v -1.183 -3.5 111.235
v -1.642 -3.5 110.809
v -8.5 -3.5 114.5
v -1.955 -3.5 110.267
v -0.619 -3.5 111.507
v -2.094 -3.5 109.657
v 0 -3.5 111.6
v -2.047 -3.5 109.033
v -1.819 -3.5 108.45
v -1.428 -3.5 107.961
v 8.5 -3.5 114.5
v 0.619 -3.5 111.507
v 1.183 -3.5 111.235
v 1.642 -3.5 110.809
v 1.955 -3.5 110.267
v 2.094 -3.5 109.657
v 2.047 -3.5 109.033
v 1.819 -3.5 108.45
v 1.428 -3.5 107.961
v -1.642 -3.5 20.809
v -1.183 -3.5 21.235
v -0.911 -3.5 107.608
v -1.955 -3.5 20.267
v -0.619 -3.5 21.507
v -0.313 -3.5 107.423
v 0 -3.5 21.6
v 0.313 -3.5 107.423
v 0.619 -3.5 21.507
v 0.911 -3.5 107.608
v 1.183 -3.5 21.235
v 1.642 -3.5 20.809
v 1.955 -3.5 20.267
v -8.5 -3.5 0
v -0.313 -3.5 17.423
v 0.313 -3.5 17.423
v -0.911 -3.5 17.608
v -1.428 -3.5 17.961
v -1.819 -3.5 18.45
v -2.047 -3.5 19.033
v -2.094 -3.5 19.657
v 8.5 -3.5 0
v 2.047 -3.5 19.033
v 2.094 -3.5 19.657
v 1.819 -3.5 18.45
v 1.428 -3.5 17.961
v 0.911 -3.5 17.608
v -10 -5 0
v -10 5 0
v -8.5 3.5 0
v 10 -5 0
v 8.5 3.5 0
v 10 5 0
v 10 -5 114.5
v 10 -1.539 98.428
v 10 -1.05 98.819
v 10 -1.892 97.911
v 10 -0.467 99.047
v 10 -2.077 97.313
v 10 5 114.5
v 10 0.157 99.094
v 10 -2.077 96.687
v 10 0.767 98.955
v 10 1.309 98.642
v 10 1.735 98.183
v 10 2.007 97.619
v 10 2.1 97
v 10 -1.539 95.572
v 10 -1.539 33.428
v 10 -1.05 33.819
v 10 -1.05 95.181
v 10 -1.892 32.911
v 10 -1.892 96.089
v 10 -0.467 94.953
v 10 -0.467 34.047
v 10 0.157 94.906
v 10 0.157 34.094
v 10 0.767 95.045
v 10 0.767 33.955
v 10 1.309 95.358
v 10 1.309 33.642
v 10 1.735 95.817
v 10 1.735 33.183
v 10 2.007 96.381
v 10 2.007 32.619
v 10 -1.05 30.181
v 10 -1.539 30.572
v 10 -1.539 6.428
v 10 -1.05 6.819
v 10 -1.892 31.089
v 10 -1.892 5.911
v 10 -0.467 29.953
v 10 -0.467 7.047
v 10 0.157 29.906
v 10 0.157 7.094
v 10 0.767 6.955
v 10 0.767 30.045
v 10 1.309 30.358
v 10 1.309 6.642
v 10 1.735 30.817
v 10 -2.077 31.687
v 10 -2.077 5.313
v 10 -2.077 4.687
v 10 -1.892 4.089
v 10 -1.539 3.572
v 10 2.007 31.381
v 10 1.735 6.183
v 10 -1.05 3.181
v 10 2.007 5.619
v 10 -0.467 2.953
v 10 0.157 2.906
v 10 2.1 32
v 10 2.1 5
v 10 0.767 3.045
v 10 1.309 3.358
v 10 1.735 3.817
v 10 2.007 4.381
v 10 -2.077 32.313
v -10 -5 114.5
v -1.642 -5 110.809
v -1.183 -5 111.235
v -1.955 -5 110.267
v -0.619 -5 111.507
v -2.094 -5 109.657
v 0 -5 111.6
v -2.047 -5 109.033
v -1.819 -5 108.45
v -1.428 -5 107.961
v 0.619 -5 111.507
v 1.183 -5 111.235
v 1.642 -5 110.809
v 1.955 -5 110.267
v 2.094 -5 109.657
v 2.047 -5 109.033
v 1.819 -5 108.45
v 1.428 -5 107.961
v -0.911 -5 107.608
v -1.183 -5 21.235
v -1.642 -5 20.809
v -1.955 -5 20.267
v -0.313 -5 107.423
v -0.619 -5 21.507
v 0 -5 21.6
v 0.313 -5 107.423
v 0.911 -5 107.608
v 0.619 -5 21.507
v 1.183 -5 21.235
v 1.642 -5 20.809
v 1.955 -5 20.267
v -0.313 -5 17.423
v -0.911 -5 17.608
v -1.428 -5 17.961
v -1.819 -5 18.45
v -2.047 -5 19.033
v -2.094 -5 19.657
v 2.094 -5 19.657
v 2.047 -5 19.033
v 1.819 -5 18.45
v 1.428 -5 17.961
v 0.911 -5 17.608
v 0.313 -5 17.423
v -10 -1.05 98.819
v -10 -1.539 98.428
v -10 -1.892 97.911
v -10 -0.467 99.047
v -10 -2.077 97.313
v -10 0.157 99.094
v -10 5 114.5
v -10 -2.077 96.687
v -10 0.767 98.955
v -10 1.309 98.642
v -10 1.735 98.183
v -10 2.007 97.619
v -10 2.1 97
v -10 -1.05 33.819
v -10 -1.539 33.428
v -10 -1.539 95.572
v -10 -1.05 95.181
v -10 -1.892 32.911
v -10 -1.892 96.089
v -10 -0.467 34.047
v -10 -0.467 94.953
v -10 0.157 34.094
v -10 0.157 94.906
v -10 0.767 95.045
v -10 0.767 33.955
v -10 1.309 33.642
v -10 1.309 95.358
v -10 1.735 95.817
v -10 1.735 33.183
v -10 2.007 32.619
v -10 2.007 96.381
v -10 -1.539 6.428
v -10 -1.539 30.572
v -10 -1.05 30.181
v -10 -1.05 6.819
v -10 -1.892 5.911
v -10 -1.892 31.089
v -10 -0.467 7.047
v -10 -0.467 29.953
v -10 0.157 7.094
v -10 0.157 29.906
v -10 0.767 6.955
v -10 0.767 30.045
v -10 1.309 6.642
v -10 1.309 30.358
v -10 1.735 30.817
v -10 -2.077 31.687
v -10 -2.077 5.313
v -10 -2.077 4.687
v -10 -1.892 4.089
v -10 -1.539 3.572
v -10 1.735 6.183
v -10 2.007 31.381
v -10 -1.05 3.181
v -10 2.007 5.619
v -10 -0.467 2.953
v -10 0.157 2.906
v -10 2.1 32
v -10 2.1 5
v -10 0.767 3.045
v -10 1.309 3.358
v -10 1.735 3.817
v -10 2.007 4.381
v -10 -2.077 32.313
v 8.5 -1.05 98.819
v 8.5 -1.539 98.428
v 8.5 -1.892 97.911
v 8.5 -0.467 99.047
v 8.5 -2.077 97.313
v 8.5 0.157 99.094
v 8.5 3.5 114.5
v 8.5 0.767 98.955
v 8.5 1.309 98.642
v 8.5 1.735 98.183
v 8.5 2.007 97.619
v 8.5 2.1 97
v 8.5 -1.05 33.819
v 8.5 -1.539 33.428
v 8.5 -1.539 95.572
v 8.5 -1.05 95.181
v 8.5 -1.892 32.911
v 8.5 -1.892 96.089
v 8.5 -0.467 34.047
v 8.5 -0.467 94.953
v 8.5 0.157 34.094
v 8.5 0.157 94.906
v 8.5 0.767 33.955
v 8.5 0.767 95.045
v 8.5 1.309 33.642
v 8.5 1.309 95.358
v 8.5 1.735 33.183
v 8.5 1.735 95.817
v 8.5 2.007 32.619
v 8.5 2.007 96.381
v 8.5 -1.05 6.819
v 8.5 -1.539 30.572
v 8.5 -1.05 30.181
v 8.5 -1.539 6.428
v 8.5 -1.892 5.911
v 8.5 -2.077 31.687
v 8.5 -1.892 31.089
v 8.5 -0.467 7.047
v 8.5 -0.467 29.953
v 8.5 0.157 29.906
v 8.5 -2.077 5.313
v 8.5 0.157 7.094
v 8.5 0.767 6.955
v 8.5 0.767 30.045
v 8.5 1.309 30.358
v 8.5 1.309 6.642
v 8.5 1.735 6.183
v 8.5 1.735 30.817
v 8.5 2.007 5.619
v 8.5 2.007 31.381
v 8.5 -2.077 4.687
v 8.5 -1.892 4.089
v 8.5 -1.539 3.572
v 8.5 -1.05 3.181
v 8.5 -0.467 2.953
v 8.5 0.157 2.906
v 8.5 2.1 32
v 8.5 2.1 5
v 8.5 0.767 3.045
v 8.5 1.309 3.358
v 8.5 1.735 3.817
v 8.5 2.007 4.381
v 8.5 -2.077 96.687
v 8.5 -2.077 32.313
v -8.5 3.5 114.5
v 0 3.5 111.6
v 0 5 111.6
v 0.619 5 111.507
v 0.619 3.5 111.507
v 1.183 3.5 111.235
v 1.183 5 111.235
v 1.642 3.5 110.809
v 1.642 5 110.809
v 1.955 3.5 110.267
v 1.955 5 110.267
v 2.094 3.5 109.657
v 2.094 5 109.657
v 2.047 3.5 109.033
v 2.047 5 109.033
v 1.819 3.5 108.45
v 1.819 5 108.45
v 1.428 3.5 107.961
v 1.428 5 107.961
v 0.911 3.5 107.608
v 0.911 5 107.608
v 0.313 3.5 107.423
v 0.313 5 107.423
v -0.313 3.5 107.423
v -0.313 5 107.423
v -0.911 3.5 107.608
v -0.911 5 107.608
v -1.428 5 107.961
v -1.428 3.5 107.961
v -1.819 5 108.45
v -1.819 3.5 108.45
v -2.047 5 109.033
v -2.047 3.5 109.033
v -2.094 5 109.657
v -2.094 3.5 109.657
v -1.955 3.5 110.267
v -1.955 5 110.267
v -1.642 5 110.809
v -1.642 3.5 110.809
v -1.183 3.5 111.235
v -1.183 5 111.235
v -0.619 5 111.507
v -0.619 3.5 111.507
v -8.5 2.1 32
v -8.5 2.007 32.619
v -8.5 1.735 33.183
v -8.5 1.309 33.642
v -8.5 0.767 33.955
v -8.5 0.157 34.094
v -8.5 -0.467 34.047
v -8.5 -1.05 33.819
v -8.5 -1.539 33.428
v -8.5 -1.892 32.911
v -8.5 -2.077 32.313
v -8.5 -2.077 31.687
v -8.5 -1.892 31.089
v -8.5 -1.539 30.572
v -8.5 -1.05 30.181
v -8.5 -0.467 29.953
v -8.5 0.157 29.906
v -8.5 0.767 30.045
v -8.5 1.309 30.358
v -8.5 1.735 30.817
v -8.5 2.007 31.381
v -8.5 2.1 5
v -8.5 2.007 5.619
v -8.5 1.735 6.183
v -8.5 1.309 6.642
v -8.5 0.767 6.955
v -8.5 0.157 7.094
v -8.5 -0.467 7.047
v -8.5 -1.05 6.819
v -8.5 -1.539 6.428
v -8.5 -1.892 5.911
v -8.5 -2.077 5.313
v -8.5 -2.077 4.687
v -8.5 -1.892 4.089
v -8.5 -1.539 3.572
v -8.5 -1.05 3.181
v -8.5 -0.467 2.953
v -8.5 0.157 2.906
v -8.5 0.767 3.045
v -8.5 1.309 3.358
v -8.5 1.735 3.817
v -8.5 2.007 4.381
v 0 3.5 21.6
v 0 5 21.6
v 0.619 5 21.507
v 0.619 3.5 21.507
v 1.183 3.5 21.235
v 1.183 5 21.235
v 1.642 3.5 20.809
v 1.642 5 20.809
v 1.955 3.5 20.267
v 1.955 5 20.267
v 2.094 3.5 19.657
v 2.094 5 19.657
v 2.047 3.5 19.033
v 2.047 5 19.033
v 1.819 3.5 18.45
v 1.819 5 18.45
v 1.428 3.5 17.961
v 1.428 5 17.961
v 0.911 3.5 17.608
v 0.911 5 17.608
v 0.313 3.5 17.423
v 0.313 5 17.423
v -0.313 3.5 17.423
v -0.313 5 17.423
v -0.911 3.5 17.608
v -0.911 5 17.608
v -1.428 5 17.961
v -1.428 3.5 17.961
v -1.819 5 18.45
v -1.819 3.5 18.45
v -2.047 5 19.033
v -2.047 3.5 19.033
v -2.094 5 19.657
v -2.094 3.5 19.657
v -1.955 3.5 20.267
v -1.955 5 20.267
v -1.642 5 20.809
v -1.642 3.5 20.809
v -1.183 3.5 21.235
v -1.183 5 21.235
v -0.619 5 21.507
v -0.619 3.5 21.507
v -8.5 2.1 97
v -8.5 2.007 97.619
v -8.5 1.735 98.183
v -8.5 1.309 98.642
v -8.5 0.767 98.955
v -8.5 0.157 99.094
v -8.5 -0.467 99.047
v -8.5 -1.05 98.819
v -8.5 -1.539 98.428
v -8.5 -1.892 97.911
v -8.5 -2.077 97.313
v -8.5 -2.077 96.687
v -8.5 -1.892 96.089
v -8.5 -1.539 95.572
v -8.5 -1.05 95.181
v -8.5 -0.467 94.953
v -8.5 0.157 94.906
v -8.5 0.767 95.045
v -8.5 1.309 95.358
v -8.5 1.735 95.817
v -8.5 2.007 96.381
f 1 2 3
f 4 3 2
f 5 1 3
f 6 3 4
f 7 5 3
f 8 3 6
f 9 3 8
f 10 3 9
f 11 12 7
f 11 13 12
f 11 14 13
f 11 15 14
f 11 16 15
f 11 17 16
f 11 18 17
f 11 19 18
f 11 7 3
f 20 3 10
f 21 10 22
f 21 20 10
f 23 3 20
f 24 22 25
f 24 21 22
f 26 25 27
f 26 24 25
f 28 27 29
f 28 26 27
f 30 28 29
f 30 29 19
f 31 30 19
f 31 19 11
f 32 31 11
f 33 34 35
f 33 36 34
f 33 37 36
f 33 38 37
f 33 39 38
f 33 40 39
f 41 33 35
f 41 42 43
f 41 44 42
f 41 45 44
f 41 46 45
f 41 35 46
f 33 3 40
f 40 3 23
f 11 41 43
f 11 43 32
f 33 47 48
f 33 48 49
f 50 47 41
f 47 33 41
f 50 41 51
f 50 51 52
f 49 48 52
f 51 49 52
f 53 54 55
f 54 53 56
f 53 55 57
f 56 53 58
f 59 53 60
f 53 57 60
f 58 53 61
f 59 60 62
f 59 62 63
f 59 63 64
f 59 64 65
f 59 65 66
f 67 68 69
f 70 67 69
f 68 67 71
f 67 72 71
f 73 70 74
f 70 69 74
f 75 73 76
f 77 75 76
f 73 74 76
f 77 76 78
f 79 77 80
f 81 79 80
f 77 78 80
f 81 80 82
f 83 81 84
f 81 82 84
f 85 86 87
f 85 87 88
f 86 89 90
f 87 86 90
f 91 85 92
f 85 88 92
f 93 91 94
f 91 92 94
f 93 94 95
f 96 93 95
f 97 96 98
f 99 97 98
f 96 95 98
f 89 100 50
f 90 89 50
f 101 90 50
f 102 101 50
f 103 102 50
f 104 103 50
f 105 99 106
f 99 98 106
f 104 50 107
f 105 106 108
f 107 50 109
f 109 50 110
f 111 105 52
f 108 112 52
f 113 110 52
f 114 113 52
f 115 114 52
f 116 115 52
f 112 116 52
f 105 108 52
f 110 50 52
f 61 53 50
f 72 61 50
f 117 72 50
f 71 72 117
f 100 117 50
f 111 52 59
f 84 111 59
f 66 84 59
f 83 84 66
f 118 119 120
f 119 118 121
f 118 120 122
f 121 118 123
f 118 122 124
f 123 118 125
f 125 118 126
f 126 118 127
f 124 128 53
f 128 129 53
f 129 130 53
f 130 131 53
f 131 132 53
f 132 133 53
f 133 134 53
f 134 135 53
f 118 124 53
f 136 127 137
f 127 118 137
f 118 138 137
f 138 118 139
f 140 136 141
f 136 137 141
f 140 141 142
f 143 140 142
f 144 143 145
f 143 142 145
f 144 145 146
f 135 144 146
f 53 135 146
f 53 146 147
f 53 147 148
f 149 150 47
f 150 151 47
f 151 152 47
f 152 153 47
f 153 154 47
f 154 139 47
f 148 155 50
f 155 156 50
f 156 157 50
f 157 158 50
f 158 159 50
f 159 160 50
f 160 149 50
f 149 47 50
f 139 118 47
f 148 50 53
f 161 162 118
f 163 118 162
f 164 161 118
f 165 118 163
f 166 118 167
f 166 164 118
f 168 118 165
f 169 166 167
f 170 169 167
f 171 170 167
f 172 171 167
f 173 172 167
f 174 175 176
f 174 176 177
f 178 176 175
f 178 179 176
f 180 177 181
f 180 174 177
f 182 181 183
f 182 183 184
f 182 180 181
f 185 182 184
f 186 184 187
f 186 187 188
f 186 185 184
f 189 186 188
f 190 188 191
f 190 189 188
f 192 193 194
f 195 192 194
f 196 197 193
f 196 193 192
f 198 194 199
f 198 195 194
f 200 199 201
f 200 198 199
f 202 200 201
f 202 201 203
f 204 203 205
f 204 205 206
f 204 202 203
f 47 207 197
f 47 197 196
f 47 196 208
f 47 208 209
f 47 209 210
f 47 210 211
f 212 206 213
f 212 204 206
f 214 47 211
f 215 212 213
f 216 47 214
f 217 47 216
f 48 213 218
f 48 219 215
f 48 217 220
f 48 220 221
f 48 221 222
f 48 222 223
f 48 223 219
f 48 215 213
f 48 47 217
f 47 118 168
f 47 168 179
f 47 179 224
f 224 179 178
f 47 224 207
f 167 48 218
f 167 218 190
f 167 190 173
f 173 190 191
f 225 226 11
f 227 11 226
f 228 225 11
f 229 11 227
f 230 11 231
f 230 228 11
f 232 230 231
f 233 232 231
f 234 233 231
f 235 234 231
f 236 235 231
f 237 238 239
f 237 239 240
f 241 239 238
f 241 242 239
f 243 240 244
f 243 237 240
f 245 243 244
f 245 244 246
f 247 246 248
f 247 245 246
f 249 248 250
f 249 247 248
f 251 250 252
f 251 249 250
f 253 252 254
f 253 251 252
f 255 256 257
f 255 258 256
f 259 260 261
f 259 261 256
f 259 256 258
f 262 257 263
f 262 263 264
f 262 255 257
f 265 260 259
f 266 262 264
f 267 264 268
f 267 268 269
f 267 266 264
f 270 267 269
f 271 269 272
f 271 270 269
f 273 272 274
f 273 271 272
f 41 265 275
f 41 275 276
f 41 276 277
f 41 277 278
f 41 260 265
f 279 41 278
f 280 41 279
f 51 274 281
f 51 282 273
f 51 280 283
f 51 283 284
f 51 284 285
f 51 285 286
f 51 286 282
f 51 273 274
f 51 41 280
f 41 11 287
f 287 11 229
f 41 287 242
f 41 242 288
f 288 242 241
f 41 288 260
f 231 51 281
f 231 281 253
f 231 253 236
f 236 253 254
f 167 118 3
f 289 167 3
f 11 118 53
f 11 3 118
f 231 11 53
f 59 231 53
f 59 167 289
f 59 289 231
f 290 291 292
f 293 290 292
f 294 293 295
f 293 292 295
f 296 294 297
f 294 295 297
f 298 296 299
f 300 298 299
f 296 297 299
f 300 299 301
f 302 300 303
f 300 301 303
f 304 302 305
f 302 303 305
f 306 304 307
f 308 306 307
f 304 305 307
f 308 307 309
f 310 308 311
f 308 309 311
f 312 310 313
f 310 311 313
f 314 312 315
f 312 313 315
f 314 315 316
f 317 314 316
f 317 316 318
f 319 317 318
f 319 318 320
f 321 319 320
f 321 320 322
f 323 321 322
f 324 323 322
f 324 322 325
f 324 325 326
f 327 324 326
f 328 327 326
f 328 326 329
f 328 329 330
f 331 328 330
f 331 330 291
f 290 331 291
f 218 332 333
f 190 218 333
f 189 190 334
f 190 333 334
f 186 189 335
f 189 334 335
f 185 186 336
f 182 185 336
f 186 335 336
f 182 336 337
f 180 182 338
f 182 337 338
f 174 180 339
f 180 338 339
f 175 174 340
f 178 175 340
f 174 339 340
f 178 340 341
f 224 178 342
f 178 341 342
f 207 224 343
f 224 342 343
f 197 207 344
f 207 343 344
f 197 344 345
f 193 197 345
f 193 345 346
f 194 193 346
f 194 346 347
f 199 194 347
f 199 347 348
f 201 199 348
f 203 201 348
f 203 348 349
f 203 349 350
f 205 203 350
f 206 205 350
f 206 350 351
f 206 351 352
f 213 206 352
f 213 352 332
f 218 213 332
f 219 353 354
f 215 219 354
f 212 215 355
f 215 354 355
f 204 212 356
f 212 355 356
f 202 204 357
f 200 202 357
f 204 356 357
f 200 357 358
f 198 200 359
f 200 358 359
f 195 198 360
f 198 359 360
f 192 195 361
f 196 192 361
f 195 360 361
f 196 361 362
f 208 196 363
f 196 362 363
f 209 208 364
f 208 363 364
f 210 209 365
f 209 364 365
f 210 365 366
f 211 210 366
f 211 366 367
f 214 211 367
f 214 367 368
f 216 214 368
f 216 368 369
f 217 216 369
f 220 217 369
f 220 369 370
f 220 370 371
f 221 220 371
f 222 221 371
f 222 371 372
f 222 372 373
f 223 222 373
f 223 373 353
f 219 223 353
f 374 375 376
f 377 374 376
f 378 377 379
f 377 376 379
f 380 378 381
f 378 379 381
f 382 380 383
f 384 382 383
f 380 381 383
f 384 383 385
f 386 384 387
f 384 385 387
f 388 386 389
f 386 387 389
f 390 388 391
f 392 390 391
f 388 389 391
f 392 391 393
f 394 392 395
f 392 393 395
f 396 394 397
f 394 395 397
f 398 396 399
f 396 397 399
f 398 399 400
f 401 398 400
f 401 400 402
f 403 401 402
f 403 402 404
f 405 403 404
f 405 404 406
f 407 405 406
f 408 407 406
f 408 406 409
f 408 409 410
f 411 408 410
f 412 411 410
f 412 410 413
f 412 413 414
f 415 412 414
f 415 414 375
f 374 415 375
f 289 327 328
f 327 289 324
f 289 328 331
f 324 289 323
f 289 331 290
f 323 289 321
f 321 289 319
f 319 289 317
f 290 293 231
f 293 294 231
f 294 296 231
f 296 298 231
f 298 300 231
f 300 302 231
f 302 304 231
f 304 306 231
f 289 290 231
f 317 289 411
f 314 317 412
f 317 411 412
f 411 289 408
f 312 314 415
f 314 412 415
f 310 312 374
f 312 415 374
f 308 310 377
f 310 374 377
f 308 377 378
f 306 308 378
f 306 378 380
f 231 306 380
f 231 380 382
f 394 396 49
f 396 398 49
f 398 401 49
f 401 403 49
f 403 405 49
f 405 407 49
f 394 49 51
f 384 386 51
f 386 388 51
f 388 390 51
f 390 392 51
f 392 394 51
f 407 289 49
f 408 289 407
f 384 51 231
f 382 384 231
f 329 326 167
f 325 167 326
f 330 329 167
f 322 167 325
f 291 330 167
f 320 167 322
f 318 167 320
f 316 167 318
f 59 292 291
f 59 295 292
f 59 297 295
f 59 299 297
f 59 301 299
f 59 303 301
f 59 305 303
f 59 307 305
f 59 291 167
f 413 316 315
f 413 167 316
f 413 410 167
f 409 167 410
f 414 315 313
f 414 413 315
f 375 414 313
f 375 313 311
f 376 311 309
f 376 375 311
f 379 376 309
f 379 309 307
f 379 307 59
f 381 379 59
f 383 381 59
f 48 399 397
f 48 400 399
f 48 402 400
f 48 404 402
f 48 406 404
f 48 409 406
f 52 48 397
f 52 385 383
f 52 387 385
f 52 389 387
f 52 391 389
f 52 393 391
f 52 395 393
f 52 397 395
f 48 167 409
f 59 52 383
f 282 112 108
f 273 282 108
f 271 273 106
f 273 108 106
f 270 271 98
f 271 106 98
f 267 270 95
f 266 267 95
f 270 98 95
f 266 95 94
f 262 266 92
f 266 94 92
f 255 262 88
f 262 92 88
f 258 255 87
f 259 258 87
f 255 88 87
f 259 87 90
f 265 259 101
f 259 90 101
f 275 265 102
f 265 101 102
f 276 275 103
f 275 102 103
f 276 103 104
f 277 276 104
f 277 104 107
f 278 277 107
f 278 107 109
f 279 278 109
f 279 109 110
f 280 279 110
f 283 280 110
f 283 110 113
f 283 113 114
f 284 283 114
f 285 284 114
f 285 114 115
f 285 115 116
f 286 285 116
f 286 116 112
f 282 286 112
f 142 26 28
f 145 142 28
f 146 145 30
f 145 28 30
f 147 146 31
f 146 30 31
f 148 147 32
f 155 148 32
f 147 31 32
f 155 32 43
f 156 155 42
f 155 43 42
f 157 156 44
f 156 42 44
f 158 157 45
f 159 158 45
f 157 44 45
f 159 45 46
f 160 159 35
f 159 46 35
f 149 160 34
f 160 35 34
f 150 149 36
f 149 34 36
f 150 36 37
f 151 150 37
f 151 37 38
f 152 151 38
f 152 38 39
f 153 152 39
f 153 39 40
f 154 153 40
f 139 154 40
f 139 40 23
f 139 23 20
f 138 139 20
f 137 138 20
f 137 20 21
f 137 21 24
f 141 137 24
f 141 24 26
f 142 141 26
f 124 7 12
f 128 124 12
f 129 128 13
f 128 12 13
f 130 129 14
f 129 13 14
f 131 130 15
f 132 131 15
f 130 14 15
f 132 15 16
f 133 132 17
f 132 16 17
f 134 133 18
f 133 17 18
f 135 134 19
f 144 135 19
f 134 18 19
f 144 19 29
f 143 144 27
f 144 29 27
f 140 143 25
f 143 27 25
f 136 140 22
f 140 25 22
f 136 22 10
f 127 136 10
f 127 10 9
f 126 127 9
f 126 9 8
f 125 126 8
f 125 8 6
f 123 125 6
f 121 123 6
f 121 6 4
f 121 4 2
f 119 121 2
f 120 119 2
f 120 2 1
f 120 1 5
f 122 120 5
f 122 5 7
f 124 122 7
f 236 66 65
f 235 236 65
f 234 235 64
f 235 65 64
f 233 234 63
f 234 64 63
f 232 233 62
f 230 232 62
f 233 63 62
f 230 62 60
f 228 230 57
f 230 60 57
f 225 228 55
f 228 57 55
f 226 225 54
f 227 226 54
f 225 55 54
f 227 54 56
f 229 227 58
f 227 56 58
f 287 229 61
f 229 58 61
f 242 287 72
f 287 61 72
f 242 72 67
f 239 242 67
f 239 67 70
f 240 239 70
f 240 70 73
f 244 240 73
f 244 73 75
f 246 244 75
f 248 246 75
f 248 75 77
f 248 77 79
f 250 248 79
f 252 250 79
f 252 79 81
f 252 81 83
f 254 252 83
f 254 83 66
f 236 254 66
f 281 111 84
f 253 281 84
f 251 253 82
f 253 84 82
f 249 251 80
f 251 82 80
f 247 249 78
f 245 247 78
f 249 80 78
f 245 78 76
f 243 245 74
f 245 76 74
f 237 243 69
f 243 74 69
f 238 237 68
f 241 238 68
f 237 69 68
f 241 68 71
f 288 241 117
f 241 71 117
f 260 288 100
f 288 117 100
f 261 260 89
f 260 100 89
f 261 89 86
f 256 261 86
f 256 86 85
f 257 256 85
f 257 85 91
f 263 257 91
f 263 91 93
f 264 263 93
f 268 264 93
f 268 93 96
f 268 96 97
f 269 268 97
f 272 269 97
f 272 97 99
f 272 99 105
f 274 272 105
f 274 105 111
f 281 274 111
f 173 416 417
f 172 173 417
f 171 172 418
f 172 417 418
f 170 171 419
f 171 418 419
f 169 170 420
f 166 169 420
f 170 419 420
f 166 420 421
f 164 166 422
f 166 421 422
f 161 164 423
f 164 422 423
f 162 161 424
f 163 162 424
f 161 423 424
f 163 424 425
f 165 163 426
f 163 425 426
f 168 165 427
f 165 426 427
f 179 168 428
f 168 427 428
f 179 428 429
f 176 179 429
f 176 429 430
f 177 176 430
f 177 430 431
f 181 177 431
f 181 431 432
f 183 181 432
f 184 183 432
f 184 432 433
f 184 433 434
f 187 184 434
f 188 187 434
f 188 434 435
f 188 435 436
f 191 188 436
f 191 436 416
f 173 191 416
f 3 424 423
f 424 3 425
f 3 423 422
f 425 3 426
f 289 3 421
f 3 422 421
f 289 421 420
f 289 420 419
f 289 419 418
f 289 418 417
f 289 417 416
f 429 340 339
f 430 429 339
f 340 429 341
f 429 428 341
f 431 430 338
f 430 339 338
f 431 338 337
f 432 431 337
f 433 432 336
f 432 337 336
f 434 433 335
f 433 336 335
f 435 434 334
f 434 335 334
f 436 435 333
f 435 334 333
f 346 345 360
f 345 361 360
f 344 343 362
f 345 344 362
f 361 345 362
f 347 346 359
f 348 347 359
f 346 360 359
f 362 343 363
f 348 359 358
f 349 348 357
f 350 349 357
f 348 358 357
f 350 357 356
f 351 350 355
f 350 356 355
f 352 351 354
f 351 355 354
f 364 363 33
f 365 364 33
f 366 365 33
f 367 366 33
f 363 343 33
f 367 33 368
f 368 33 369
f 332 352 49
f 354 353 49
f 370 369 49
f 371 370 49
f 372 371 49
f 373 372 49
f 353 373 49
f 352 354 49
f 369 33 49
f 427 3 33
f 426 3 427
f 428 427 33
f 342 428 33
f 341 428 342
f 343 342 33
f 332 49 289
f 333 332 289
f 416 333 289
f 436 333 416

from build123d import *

# Parameters (mm, degrees)
SKETCH_1_W          = 20
SKETCH_1_H          = 10
SKETCH_1_W_2        = 17
SKETCH_1_H_2        = 7
EXTRUDE_1_DEPTH     = 114.5
SKETCH_2_R          = 2.1
CUT_EXTRUDE_1_DEPTH = 117.341093342
SKETCH_3_R          = 2.1
CUT_EXTRUDE_2_DEPTH = 117.341093342
SKETCH_4_R          = 2.1
CUT_EXTRUDE_3_DEPTH = 116.370056774


with BuildPart() as part:
    # ｽｹｯﾁ1 → 押し出し-薄板1 (new body)
    with BuildSketch(Plane.XY):
        Rectangle(SKETCH_1_W, SKETCH_1_H)
        Rectangle(SKETCH_1_W_2, SKETCH_1_H_2, mode=Mode.SUBTRACT)
    extrude(amount=EXTRUDE_1_DEPTH)

    # ｽｹｯﾁ2 → ｶｯﾄ - 押し出し1 (cut, through all)
    with BuildSketch(Plane(origin=(10, 0, 0), x_dir=(0, 0, -1), z_dir=(1, 0, 0))):
        with Locations(Location((-97, 0, 0), (0, 0, 90))):
            Circle(SKETCH_2_R)
        with Locations(Location((-32, 0, 0), (0, 0, 90))):
            Circle(SKETCH_2_R)
    extrude(amount=-CUT_EXTRUDE_1_DEPTH, mode=Mode.SUBTRACT)

    # ｽｹｯﾁ3 → ｶｯﾄ - 押し出し2 (cut, through all)
    with BuildSketch(Plane(origin=(10, 0, 0), x_dir=(0, 0, -1), z_dir=(1, 0, 0))):
        with Locations(Location((-5, 0, 0), (0, 0, 90))):
            Circle(SKETCH_3_R)
    extrude(amount=-CUT_EXTRUDE_2_DEPTH, mode=Mode.SUBTRACT)

    # ｽｹｯﾁ4 → ｶｯﾄ - 押し出し3 (cut, through all)
    with BuildSketch(Plane(origin=(0, 5, 0), x_dir=(1, 0, 0), z_dir=(0, 1, 0))):
        with Locations(Location((0, -19.5, 0), (0, 0, 270))):
            Circle(SKETCH_4_R)
        with Locations(Location((0, -109.5, 0), (0, 0, 270))):
            Circle(SKETCH_4_R)
    extrude(amount=-CUT_EXTRUDE_3_DEPTH, mode=Mode.SUBTRACT)


solid = part.part
